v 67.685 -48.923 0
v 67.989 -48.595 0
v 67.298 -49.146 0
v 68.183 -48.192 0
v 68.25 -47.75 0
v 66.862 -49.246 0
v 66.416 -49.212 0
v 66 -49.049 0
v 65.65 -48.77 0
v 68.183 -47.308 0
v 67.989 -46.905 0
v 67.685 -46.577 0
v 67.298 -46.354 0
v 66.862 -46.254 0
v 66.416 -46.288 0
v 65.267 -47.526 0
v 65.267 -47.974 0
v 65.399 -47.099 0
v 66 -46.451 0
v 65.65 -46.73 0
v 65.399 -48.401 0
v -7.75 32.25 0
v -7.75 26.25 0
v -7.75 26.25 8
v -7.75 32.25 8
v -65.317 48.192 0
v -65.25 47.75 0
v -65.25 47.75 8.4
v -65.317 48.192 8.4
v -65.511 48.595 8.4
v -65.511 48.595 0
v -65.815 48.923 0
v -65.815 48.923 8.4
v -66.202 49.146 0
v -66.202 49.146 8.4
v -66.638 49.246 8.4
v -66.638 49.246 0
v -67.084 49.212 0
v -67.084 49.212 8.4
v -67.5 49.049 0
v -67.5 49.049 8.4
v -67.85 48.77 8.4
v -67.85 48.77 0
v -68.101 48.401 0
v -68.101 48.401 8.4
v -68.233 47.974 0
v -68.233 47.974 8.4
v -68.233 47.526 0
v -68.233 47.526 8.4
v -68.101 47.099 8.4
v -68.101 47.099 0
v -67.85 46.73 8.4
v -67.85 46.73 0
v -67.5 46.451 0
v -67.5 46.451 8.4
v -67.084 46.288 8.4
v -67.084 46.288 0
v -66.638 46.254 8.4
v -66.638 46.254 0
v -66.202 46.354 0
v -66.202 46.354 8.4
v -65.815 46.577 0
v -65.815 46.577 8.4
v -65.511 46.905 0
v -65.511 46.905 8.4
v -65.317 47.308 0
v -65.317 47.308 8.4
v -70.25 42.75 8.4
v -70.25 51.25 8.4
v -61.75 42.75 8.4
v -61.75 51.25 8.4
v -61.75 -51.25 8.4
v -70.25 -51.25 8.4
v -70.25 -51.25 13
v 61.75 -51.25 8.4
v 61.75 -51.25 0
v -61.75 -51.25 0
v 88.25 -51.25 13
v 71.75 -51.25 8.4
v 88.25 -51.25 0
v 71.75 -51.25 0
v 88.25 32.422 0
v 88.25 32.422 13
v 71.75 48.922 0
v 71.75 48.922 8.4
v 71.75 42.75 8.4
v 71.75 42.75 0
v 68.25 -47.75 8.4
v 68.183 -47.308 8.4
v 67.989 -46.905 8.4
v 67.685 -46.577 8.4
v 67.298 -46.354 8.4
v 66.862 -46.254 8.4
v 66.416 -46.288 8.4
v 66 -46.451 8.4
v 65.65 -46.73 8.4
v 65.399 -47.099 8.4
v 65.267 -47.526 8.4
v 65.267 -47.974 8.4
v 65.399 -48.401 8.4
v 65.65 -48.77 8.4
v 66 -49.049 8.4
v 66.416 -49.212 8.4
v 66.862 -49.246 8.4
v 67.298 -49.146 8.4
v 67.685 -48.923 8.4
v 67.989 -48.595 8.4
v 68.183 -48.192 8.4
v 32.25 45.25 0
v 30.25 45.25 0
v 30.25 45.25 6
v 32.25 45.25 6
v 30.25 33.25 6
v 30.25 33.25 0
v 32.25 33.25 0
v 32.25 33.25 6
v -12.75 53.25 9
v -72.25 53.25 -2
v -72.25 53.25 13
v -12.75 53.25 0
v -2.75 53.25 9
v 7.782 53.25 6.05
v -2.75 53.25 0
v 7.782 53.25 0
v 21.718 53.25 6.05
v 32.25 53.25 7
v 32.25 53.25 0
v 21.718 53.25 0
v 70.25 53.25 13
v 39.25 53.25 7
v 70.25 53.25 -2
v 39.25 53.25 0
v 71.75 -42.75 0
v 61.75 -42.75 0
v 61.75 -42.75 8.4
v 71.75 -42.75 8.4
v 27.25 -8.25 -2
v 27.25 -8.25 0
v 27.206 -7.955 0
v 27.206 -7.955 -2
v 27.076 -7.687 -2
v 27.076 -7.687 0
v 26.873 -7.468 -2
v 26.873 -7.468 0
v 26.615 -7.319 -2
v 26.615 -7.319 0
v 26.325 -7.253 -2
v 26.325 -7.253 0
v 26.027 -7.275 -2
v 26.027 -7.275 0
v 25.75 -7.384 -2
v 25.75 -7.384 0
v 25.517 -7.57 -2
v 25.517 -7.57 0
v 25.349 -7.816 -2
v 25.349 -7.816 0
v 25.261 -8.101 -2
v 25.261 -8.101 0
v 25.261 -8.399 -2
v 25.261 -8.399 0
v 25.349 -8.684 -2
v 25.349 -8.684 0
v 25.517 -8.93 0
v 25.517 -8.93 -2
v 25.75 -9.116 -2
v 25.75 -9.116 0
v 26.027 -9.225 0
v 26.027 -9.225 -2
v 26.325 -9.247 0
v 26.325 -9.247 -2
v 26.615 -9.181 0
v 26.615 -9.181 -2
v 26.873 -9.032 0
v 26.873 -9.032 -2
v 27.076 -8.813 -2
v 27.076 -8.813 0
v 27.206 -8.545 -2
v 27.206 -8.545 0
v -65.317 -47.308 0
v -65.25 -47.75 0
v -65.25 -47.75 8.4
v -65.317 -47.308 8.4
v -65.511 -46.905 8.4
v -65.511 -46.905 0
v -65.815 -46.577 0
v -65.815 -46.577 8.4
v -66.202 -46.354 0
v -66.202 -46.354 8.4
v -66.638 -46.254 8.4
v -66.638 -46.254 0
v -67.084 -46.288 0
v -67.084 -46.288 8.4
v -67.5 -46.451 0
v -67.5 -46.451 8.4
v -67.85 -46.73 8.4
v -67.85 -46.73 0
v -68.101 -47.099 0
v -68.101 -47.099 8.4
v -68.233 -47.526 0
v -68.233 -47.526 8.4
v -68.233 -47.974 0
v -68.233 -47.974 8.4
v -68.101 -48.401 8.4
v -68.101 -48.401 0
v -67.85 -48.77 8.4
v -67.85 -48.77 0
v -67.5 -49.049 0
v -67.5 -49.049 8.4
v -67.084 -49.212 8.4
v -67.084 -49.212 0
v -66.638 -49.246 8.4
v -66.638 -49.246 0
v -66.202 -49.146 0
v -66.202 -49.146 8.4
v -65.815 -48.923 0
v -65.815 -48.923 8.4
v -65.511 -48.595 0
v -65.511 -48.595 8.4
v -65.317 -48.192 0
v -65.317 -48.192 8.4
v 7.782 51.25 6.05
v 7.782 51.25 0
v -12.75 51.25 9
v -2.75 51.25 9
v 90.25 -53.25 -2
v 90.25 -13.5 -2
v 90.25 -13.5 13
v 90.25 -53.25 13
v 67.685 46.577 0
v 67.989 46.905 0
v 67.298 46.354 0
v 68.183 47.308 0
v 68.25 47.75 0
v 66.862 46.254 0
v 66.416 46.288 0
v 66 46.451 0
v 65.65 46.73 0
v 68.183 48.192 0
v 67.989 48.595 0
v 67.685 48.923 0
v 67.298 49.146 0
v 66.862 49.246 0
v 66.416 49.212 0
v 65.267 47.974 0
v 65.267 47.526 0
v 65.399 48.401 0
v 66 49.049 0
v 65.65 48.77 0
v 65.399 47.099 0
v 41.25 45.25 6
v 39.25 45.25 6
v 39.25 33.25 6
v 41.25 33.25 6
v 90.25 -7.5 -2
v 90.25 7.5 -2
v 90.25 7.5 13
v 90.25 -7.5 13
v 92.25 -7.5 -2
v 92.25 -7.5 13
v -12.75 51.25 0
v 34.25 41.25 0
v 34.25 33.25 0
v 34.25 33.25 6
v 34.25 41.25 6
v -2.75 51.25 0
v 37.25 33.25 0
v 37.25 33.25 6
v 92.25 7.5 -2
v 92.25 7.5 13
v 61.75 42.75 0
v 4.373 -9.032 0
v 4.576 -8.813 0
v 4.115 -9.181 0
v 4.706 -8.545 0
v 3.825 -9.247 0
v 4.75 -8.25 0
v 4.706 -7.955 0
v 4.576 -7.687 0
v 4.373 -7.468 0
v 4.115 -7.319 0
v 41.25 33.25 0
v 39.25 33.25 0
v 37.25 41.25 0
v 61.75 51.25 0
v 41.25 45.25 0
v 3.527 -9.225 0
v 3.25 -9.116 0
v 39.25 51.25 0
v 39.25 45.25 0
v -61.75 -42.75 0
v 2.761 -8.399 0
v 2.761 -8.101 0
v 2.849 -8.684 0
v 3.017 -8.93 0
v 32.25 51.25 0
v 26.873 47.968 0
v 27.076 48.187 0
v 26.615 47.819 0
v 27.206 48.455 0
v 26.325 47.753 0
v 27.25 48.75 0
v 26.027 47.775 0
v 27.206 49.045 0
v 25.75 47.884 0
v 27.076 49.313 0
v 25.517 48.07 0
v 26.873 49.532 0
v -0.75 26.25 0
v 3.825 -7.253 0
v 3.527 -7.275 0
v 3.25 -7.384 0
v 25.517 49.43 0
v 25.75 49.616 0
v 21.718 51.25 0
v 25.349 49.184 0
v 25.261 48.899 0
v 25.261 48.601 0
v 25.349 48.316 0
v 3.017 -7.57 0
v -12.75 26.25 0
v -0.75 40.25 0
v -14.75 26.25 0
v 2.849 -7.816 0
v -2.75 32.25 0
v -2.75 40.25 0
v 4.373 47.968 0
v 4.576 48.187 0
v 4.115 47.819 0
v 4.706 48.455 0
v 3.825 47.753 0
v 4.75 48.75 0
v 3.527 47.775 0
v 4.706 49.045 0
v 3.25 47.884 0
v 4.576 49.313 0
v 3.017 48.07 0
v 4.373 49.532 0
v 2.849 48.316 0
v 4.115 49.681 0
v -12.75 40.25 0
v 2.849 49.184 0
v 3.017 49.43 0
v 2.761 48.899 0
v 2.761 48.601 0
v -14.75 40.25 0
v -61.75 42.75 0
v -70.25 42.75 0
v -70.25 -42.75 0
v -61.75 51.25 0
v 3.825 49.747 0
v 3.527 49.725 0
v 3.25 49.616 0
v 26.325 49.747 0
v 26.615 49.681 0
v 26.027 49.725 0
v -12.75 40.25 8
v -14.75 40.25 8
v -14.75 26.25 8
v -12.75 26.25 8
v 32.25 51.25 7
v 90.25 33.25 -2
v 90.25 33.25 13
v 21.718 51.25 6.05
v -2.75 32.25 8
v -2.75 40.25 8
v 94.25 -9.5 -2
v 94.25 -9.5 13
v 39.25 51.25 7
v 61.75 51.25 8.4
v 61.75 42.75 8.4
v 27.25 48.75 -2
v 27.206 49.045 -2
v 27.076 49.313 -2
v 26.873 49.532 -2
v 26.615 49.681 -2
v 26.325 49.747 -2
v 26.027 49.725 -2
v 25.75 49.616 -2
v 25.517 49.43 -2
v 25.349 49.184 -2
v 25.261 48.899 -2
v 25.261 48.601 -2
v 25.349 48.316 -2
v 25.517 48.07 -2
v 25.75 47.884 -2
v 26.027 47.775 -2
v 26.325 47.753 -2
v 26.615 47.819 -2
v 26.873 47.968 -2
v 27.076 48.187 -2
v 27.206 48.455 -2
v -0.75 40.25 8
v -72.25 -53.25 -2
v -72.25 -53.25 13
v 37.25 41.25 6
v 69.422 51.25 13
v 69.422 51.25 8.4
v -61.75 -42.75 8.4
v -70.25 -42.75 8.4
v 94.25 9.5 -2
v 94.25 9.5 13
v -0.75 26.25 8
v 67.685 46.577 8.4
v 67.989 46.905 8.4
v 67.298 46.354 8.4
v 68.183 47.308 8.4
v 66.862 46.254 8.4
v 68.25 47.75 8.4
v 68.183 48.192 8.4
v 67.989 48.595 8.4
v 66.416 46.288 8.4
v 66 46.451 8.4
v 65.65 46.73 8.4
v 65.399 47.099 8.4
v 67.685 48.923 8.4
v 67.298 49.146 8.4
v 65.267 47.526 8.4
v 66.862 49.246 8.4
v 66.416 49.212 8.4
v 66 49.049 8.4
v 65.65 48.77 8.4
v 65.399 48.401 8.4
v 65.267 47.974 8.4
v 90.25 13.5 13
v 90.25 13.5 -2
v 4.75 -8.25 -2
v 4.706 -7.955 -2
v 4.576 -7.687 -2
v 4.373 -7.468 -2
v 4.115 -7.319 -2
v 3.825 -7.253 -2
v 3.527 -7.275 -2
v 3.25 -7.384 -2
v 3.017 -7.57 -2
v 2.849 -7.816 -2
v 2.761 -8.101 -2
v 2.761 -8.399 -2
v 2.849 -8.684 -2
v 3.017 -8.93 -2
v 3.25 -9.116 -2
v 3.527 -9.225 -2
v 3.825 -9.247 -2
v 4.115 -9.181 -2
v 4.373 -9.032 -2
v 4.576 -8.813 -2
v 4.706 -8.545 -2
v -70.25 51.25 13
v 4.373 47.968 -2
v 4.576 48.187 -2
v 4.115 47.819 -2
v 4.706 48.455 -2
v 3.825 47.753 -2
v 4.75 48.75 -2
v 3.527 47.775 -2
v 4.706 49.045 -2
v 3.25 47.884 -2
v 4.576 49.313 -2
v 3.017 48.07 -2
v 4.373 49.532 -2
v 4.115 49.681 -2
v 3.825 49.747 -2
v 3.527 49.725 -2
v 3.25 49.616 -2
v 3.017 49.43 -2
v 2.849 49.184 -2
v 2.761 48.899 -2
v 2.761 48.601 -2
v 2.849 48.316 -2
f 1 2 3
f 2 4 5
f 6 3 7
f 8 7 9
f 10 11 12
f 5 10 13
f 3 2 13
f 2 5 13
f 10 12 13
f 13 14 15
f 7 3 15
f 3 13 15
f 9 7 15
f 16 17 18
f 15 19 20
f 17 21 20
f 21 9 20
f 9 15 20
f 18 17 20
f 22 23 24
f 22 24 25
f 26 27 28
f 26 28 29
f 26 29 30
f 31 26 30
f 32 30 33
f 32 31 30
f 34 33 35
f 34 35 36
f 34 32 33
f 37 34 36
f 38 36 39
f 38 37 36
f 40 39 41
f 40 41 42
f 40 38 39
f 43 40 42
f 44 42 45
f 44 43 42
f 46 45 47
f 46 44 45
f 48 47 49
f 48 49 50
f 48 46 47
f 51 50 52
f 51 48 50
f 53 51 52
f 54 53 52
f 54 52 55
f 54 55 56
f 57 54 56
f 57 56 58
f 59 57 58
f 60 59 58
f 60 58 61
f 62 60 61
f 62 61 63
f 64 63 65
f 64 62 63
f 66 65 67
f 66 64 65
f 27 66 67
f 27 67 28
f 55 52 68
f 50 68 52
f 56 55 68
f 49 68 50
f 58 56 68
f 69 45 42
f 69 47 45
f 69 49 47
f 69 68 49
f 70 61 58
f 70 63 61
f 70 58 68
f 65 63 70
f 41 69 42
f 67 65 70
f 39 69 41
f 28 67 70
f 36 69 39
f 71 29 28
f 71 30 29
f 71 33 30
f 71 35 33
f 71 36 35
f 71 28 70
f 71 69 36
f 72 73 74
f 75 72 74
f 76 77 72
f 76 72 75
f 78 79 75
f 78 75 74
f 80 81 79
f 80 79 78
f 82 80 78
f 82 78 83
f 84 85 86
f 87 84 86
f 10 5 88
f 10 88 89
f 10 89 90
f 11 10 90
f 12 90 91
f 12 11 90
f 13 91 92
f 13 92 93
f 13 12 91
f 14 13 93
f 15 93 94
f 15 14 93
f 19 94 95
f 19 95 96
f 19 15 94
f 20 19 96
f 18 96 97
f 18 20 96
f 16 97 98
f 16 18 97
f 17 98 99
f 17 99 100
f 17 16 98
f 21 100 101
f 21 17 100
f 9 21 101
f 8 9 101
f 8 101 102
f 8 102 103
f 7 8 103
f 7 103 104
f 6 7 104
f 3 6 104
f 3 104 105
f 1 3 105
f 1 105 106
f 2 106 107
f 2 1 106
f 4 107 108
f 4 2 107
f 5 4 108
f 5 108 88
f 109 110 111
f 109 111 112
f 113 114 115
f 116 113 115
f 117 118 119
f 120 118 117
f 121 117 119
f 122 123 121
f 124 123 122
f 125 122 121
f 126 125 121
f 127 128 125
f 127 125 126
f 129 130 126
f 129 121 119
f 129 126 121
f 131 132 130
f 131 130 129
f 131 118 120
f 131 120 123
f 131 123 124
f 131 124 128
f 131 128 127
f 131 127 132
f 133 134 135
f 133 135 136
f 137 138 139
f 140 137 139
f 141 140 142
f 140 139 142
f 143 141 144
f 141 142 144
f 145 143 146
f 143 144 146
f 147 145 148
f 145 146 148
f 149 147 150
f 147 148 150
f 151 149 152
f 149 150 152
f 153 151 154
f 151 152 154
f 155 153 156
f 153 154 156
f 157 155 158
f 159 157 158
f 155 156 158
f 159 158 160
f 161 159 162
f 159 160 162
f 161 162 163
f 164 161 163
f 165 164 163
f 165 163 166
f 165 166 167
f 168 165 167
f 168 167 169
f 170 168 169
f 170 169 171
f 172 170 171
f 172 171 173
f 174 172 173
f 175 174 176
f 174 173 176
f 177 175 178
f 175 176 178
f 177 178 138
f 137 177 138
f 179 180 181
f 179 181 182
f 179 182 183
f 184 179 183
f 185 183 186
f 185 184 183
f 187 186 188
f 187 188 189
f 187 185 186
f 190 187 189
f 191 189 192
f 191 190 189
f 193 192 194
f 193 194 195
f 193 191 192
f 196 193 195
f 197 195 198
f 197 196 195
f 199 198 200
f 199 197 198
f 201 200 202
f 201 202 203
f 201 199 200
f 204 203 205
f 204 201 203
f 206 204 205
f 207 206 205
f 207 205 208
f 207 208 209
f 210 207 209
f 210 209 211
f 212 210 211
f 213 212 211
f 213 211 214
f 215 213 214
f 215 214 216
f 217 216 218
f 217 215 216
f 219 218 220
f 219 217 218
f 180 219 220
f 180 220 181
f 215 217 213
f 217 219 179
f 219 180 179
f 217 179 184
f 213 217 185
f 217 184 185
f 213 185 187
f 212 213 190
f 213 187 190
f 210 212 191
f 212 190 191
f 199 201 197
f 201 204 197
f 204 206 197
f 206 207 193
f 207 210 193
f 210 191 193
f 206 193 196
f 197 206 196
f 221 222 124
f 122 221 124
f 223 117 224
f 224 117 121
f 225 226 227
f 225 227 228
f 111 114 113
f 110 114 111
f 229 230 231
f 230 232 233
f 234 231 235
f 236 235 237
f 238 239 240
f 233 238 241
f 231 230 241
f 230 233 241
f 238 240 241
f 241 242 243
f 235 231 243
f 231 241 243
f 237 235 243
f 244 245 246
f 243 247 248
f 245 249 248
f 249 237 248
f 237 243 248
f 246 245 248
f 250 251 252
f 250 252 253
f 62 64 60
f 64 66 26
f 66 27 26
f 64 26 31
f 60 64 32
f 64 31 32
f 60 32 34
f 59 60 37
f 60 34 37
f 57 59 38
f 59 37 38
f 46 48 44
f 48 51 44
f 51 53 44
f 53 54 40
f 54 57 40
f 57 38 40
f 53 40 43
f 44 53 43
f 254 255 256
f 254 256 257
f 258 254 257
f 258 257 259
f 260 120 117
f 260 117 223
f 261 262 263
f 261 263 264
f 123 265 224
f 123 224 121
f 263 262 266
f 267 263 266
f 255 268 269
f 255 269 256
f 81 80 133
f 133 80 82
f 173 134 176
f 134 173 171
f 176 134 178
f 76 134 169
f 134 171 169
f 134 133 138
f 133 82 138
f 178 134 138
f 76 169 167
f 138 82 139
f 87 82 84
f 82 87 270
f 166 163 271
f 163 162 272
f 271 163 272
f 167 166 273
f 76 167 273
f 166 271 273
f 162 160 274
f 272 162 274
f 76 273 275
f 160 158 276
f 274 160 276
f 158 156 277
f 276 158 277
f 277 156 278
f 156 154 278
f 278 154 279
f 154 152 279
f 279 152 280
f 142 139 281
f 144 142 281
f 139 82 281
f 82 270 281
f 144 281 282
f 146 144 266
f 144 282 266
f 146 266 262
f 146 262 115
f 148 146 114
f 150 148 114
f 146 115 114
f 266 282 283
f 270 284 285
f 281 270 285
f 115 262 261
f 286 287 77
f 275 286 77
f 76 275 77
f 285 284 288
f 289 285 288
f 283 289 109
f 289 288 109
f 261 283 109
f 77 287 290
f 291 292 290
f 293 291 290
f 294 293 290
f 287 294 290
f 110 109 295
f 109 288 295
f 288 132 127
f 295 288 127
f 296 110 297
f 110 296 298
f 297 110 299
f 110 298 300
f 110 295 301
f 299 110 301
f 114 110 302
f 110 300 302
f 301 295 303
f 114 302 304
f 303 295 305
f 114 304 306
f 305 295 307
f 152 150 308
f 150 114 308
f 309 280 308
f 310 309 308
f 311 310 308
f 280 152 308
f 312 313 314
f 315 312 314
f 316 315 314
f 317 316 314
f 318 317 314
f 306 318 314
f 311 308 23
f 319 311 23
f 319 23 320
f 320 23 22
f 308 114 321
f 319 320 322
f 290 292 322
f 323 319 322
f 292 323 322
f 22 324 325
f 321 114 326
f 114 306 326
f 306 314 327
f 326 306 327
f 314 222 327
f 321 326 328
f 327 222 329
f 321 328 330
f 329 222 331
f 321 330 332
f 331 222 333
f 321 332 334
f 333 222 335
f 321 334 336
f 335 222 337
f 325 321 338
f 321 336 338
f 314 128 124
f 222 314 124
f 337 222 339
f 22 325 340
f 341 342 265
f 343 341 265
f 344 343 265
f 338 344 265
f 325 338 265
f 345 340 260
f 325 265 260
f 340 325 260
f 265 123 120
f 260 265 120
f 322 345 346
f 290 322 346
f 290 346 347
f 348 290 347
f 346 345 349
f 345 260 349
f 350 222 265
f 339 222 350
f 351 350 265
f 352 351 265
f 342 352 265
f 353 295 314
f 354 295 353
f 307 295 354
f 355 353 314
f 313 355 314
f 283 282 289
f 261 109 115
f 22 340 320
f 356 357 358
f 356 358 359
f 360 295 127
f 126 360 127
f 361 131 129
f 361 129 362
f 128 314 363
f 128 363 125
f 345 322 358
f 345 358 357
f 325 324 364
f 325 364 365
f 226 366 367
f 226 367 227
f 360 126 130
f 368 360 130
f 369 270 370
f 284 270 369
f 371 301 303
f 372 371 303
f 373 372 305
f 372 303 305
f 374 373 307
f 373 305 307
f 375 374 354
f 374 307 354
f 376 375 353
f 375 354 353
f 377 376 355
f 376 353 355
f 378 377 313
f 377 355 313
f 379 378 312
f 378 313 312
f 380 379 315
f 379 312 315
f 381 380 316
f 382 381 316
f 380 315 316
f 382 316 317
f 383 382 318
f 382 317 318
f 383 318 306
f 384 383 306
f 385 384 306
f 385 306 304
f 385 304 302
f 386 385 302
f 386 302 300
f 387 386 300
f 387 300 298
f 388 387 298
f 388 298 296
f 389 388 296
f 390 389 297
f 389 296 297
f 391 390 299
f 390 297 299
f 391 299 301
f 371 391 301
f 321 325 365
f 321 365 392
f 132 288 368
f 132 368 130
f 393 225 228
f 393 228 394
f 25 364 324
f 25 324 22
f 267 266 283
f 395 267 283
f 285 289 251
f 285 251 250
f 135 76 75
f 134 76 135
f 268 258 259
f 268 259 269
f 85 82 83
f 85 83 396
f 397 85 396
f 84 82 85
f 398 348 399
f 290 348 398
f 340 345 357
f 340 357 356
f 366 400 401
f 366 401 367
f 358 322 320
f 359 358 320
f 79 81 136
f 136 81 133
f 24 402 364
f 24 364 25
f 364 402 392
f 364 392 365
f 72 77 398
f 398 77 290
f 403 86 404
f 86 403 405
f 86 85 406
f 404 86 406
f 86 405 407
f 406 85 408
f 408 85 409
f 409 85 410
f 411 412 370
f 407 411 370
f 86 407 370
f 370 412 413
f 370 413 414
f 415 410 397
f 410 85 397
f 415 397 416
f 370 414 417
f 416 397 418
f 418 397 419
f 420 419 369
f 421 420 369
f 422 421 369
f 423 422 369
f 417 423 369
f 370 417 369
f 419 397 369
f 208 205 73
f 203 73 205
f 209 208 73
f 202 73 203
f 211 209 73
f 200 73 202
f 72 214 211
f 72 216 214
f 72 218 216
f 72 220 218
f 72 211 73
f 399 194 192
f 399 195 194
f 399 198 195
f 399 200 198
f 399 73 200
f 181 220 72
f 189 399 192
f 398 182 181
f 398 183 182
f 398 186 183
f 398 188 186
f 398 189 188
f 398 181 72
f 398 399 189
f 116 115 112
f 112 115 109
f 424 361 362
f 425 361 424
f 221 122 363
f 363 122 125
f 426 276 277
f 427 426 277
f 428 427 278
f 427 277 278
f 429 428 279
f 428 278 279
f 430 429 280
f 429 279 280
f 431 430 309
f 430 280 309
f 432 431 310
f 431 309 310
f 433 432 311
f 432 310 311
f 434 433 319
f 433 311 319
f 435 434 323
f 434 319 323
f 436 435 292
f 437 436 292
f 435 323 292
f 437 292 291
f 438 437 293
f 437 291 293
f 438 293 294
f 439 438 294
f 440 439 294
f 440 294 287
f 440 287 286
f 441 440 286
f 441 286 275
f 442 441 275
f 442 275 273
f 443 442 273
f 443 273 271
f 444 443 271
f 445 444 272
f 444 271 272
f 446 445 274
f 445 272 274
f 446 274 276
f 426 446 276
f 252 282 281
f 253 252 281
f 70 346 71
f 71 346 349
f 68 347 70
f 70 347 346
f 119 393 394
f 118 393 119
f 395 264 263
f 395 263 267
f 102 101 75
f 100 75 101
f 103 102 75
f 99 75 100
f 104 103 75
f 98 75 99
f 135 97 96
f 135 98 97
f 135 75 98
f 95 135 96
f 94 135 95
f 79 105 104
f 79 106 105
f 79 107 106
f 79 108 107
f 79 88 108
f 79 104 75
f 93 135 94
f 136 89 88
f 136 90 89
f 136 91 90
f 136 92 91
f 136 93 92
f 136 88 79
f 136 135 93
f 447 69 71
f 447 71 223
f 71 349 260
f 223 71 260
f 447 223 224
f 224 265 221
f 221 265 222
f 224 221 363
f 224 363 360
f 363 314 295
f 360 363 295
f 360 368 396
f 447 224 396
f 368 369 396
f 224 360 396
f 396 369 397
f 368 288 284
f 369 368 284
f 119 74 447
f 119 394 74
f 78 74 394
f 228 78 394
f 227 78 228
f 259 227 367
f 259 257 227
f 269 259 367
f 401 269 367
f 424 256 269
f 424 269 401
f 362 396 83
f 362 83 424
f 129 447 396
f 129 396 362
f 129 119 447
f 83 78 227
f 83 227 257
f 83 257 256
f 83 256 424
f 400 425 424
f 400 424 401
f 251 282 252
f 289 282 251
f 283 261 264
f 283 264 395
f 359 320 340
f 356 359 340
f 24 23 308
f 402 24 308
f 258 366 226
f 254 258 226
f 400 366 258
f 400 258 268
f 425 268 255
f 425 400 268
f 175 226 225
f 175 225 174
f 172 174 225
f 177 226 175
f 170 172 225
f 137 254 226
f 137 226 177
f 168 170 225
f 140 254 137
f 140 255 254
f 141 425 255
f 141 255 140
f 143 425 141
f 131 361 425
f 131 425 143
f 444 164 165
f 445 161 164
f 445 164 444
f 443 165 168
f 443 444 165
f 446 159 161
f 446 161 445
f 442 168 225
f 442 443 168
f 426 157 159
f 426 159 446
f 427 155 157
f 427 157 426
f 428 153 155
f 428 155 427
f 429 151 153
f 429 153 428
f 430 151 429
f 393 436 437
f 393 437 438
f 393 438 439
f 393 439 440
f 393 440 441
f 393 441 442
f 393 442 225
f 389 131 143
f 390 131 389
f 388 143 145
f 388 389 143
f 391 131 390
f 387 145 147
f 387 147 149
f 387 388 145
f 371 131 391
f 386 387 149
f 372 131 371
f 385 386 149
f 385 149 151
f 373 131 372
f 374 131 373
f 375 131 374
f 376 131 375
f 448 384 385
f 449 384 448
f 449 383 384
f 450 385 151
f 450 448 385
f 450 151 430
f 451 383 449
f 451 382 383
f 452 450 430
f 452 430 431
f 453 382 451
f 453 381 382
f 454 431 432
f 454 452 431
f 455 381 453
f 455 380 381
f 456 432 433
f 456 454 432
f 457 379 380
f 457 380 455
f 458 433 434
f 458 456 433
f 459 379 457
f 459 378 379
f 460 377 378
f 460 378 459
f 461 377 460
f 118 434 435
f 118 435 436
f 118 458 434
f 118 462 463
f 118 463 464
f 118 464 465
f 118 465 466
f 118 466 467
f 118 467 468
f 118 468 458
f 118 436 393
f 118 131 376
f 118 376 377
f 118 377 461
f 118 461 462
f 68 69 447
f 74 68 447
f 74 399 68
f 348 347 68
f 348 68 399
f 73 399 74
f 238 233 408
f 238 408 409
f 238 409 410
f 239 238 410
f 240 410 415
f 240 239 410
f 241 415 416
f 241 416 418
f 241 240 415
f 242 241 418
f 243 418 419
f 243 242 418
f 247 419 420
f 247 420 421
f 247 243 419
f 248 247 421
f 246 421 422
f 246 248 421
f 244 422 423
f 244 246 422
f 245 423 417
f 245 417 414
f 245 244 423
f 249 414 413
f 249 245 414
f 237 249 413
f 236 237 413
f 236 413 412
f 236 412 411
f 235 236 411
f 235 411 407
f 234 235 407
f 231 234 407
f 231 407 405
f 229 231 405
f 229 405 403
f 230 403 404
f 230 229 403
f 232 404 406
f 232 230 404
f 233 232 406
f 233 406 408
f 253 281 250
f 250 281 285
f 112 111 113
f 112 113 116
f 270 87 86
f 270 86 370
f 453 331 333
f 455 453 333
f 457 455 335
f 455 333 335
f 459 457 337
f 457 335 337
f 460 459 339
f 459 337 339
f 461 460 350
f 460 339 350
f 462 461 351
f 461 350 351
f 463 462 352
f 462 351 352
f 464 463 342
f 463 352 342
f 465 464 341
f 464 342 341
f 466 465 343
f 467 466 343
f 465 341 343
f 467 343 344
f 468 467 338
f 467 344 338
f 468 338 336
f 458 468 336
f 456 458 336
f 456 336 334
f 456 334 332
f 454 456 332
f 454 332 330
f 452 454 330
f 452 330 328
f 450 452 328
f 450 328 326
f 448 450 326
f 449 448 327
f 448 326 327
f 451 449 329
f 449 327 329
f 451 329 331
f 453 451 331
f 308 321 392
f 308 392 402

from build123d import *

# Parameters (mm, degrees)
SKETCH1_R           = 1
BOSS_EXTRUDE1_DEPTH = 2
SKETCH3_R           = 1.5
SKETCH3_W           = 10
SKETCH3_H           = 10
BOSS_EXTRUDE2_DEPTH = 8.4
SKETCH5_W           = 10.532166359
SKETCH5_H           = 2
BOSS_EXTRUDE3_DEPTH = 13
SKETCH6_W           = 10
SKETCH6_H           = 4
SKETCH6_W_2         = 13.935667282
SKETCH6_H_2         = 6.95
SKETCH6_W_3         = 7
SKETCH6_H_3         = 6
BOSS_EXTRUDE4_DEPTH = 2
SKETCH7_W           = 3
SKETCH7_H           = 8
SKETCH7_W_2         = 2
SKETCH7_H_2         = 12
BOSS_EXTRUDE5_DEPTH = 6
SKETCH8_W           = 2
SKETCH8_H           = 14
BOSS_EXTRUDE6_DEPTH = 8
BOSS_EXTRUDE7_DEPTH = 15


with BuildPart() as part:
    # Sketch1 → Boss-Extrude1 (new body)
    with BuildSketch(Plane.XY):
        Polygon((90.25, -53.25), (-72.25, -53.25), (-72.25, 53.25), (70.25, 53.25), (90.25, 33.25), align=None)
        with Locations((3.75, -8.25)):
            Circle(SKETCH1_R, mode=Mode.SUBTRACT)
        with Locations((26.25, -8.25)):
            Circle(SKETCH1_R, mode=Mode.SUBTRACT)
        with Locations((26.25, 48.75)):
            Circle(SKETCH1_R, mode=Mode.SUBTRACT)
        with Locations((3.75, 48.75)):
            Circle(SKETCH1_R, mode=Mode.SUBTRACT)
    extrude(amount=-BOSS_EXTRUDE1_DEPTH)

    # Sketch3 → Boss-Extrude2 (add)
    # profile 1 of 4: a face of its own
    with BuildSketch(Plane.XY):
        Polygon((61.75, 52.75), (70.75, 52.75), (71.75, 51.75), (71.75, 42.75), (61.75, 42.75), align=None)
        with Locations((66.75, 47.75)):
            Circle(SKETCH3_R, mode=Mode.SUBTRACT)
    # profile 2 of 4: a face of its own
    with BuildSketch(Plane.XY):
        with Locations((66.75, -47.75)):
            Rectangle(SKETCH3_W, SKETCH3_H)
        with Locations((66.75, -47.75)):
            Circle(SKETCH3_R, mode=Mode.SUBTRACT)
    # profile 3 of 4: a face of its own
    with BuildSketch(Plane.XY):
        with Locations((-66.75, 47.75)):
            Rectangle(SKETCH3_W, SKETCH3_H)
        with Locations((-66.75, 47.75)):
            Circle(SKETCH3_R, mode=Mode.SUBTRACT)
    # profile 4 of 4: a face of its own
    with BuildSketch(Plane.XY):
        with Locations((-66.75, -47.75)):
            Rectangle(SKETCH3_W, SKETCH3_H)
        with Locations((-66.75, -47.75)):
            Circle(SKETCH3_R, mode=Mode.SUBTRACT)
    extrude(amount=BOSS_EXTRUDE2_DEPTH)

    # Sketch5 → Boss-Extrude3 (add)
    with BuildSketch(Plane.XY):
        Polygon((90.25, 33.25), (90.25, -53.25), (-72.25, -53.25), (-72.25, 53.25), (-12.75, 53.25), (-12.75, 51.25), (-70.25, 51.25), (-70.25, -51.25), (88.25, -51.25), (88.25, 32.421572875), (69.421572875, 51.25), (39.25, 51.25), (39.25, 53.25), (70.25, 53.25), align=None)
        with Locations((2.51608318, 52.25)):
            Rectangle(SKETCH5_W, SKETCH5_H)
        with Locations((26.98391682, 52.25)):
            Rectangle(SKETCH5_W, SKETCH5_H)
    extrude(amount=BOSS_EXTRUDE3_DEPTH)

    # Sketch6 → Boss-Extrude4 (add)
    with BuildSketch(Plane(origin=(0, 53.25, 0), x_dir=(1, 0, 0), z_dir=(0, 1, 0))):
        with Locations((-7.75, -11)):
            Rectangle(SKETCH6_W, SKETCH6_H)
        with Locations((14.75, -9.525)):
            Rectangle(SKETCH6_W_2, SKETCH6_H_2)
        with Locations((35.75, -10)):
            Rectangle(SKETCH6_W_3, SKETCH6_H_3)
    extrude(amount=-BOSS_EXTRUDE4_DEPTH)

    # Sketch7 → Boss-Extrude5 (add)
    with BuildSketch(Plane.XY):
        with Locations((35.75, 37.25)):
            Rectangle(SKETCH7_W, SKETCH7_H)
        with Locations((31.25, 39.25)):
            Rectangle(SKETCH7_W_2, SKETCH7_H_2)
        with Locations((40.25, 39.25)):
            Rectangle(SKETCH7_W_2, SKETCH7_H_2)
    extrude(amount=BOSS_EXTRUDE5_DEPTH)

    # Sketch8 → Boss-Extrude6 (add)
    with BuildSketch(Plane.XY):
        with Locations((-13.75, 33.25)):
            Rectangle(SKETCH8_W, SKETCH8_H)
        Polygon((-7.75, 26.25), (-7.75, 32.25), (-3.75, 32.25), (-2.75, 32.25), (-2.75, 40.25), (-0.75, 40.25), (-0.75, 26.25), (-2.75, 26.25), align=None)
    extrude(amount=BOSS_EXTRUDE6_DEPTH)

    # Sketch9 → Boss-Extrude7 (add)
    with BuildSketch(Plane(origin=(0, 0, -2), x_dir=(-1, 0, 0), z_dir=(0, 0, -1))):
        Polygon((-92.25, 7.5), (-90.25, 7.5), (-90.25, 9.5), (-90.25, 13.5), (-94.25, 9.5), (-94.25, -9.5), (-90.25, -13.5), (-90.25, -9.5), (-90.25, -7.5), (-92.25, -7.5), align=None)
    extrude(amount=-BOSS_EXTRUDE7_DEPTH)


solid = part.part
